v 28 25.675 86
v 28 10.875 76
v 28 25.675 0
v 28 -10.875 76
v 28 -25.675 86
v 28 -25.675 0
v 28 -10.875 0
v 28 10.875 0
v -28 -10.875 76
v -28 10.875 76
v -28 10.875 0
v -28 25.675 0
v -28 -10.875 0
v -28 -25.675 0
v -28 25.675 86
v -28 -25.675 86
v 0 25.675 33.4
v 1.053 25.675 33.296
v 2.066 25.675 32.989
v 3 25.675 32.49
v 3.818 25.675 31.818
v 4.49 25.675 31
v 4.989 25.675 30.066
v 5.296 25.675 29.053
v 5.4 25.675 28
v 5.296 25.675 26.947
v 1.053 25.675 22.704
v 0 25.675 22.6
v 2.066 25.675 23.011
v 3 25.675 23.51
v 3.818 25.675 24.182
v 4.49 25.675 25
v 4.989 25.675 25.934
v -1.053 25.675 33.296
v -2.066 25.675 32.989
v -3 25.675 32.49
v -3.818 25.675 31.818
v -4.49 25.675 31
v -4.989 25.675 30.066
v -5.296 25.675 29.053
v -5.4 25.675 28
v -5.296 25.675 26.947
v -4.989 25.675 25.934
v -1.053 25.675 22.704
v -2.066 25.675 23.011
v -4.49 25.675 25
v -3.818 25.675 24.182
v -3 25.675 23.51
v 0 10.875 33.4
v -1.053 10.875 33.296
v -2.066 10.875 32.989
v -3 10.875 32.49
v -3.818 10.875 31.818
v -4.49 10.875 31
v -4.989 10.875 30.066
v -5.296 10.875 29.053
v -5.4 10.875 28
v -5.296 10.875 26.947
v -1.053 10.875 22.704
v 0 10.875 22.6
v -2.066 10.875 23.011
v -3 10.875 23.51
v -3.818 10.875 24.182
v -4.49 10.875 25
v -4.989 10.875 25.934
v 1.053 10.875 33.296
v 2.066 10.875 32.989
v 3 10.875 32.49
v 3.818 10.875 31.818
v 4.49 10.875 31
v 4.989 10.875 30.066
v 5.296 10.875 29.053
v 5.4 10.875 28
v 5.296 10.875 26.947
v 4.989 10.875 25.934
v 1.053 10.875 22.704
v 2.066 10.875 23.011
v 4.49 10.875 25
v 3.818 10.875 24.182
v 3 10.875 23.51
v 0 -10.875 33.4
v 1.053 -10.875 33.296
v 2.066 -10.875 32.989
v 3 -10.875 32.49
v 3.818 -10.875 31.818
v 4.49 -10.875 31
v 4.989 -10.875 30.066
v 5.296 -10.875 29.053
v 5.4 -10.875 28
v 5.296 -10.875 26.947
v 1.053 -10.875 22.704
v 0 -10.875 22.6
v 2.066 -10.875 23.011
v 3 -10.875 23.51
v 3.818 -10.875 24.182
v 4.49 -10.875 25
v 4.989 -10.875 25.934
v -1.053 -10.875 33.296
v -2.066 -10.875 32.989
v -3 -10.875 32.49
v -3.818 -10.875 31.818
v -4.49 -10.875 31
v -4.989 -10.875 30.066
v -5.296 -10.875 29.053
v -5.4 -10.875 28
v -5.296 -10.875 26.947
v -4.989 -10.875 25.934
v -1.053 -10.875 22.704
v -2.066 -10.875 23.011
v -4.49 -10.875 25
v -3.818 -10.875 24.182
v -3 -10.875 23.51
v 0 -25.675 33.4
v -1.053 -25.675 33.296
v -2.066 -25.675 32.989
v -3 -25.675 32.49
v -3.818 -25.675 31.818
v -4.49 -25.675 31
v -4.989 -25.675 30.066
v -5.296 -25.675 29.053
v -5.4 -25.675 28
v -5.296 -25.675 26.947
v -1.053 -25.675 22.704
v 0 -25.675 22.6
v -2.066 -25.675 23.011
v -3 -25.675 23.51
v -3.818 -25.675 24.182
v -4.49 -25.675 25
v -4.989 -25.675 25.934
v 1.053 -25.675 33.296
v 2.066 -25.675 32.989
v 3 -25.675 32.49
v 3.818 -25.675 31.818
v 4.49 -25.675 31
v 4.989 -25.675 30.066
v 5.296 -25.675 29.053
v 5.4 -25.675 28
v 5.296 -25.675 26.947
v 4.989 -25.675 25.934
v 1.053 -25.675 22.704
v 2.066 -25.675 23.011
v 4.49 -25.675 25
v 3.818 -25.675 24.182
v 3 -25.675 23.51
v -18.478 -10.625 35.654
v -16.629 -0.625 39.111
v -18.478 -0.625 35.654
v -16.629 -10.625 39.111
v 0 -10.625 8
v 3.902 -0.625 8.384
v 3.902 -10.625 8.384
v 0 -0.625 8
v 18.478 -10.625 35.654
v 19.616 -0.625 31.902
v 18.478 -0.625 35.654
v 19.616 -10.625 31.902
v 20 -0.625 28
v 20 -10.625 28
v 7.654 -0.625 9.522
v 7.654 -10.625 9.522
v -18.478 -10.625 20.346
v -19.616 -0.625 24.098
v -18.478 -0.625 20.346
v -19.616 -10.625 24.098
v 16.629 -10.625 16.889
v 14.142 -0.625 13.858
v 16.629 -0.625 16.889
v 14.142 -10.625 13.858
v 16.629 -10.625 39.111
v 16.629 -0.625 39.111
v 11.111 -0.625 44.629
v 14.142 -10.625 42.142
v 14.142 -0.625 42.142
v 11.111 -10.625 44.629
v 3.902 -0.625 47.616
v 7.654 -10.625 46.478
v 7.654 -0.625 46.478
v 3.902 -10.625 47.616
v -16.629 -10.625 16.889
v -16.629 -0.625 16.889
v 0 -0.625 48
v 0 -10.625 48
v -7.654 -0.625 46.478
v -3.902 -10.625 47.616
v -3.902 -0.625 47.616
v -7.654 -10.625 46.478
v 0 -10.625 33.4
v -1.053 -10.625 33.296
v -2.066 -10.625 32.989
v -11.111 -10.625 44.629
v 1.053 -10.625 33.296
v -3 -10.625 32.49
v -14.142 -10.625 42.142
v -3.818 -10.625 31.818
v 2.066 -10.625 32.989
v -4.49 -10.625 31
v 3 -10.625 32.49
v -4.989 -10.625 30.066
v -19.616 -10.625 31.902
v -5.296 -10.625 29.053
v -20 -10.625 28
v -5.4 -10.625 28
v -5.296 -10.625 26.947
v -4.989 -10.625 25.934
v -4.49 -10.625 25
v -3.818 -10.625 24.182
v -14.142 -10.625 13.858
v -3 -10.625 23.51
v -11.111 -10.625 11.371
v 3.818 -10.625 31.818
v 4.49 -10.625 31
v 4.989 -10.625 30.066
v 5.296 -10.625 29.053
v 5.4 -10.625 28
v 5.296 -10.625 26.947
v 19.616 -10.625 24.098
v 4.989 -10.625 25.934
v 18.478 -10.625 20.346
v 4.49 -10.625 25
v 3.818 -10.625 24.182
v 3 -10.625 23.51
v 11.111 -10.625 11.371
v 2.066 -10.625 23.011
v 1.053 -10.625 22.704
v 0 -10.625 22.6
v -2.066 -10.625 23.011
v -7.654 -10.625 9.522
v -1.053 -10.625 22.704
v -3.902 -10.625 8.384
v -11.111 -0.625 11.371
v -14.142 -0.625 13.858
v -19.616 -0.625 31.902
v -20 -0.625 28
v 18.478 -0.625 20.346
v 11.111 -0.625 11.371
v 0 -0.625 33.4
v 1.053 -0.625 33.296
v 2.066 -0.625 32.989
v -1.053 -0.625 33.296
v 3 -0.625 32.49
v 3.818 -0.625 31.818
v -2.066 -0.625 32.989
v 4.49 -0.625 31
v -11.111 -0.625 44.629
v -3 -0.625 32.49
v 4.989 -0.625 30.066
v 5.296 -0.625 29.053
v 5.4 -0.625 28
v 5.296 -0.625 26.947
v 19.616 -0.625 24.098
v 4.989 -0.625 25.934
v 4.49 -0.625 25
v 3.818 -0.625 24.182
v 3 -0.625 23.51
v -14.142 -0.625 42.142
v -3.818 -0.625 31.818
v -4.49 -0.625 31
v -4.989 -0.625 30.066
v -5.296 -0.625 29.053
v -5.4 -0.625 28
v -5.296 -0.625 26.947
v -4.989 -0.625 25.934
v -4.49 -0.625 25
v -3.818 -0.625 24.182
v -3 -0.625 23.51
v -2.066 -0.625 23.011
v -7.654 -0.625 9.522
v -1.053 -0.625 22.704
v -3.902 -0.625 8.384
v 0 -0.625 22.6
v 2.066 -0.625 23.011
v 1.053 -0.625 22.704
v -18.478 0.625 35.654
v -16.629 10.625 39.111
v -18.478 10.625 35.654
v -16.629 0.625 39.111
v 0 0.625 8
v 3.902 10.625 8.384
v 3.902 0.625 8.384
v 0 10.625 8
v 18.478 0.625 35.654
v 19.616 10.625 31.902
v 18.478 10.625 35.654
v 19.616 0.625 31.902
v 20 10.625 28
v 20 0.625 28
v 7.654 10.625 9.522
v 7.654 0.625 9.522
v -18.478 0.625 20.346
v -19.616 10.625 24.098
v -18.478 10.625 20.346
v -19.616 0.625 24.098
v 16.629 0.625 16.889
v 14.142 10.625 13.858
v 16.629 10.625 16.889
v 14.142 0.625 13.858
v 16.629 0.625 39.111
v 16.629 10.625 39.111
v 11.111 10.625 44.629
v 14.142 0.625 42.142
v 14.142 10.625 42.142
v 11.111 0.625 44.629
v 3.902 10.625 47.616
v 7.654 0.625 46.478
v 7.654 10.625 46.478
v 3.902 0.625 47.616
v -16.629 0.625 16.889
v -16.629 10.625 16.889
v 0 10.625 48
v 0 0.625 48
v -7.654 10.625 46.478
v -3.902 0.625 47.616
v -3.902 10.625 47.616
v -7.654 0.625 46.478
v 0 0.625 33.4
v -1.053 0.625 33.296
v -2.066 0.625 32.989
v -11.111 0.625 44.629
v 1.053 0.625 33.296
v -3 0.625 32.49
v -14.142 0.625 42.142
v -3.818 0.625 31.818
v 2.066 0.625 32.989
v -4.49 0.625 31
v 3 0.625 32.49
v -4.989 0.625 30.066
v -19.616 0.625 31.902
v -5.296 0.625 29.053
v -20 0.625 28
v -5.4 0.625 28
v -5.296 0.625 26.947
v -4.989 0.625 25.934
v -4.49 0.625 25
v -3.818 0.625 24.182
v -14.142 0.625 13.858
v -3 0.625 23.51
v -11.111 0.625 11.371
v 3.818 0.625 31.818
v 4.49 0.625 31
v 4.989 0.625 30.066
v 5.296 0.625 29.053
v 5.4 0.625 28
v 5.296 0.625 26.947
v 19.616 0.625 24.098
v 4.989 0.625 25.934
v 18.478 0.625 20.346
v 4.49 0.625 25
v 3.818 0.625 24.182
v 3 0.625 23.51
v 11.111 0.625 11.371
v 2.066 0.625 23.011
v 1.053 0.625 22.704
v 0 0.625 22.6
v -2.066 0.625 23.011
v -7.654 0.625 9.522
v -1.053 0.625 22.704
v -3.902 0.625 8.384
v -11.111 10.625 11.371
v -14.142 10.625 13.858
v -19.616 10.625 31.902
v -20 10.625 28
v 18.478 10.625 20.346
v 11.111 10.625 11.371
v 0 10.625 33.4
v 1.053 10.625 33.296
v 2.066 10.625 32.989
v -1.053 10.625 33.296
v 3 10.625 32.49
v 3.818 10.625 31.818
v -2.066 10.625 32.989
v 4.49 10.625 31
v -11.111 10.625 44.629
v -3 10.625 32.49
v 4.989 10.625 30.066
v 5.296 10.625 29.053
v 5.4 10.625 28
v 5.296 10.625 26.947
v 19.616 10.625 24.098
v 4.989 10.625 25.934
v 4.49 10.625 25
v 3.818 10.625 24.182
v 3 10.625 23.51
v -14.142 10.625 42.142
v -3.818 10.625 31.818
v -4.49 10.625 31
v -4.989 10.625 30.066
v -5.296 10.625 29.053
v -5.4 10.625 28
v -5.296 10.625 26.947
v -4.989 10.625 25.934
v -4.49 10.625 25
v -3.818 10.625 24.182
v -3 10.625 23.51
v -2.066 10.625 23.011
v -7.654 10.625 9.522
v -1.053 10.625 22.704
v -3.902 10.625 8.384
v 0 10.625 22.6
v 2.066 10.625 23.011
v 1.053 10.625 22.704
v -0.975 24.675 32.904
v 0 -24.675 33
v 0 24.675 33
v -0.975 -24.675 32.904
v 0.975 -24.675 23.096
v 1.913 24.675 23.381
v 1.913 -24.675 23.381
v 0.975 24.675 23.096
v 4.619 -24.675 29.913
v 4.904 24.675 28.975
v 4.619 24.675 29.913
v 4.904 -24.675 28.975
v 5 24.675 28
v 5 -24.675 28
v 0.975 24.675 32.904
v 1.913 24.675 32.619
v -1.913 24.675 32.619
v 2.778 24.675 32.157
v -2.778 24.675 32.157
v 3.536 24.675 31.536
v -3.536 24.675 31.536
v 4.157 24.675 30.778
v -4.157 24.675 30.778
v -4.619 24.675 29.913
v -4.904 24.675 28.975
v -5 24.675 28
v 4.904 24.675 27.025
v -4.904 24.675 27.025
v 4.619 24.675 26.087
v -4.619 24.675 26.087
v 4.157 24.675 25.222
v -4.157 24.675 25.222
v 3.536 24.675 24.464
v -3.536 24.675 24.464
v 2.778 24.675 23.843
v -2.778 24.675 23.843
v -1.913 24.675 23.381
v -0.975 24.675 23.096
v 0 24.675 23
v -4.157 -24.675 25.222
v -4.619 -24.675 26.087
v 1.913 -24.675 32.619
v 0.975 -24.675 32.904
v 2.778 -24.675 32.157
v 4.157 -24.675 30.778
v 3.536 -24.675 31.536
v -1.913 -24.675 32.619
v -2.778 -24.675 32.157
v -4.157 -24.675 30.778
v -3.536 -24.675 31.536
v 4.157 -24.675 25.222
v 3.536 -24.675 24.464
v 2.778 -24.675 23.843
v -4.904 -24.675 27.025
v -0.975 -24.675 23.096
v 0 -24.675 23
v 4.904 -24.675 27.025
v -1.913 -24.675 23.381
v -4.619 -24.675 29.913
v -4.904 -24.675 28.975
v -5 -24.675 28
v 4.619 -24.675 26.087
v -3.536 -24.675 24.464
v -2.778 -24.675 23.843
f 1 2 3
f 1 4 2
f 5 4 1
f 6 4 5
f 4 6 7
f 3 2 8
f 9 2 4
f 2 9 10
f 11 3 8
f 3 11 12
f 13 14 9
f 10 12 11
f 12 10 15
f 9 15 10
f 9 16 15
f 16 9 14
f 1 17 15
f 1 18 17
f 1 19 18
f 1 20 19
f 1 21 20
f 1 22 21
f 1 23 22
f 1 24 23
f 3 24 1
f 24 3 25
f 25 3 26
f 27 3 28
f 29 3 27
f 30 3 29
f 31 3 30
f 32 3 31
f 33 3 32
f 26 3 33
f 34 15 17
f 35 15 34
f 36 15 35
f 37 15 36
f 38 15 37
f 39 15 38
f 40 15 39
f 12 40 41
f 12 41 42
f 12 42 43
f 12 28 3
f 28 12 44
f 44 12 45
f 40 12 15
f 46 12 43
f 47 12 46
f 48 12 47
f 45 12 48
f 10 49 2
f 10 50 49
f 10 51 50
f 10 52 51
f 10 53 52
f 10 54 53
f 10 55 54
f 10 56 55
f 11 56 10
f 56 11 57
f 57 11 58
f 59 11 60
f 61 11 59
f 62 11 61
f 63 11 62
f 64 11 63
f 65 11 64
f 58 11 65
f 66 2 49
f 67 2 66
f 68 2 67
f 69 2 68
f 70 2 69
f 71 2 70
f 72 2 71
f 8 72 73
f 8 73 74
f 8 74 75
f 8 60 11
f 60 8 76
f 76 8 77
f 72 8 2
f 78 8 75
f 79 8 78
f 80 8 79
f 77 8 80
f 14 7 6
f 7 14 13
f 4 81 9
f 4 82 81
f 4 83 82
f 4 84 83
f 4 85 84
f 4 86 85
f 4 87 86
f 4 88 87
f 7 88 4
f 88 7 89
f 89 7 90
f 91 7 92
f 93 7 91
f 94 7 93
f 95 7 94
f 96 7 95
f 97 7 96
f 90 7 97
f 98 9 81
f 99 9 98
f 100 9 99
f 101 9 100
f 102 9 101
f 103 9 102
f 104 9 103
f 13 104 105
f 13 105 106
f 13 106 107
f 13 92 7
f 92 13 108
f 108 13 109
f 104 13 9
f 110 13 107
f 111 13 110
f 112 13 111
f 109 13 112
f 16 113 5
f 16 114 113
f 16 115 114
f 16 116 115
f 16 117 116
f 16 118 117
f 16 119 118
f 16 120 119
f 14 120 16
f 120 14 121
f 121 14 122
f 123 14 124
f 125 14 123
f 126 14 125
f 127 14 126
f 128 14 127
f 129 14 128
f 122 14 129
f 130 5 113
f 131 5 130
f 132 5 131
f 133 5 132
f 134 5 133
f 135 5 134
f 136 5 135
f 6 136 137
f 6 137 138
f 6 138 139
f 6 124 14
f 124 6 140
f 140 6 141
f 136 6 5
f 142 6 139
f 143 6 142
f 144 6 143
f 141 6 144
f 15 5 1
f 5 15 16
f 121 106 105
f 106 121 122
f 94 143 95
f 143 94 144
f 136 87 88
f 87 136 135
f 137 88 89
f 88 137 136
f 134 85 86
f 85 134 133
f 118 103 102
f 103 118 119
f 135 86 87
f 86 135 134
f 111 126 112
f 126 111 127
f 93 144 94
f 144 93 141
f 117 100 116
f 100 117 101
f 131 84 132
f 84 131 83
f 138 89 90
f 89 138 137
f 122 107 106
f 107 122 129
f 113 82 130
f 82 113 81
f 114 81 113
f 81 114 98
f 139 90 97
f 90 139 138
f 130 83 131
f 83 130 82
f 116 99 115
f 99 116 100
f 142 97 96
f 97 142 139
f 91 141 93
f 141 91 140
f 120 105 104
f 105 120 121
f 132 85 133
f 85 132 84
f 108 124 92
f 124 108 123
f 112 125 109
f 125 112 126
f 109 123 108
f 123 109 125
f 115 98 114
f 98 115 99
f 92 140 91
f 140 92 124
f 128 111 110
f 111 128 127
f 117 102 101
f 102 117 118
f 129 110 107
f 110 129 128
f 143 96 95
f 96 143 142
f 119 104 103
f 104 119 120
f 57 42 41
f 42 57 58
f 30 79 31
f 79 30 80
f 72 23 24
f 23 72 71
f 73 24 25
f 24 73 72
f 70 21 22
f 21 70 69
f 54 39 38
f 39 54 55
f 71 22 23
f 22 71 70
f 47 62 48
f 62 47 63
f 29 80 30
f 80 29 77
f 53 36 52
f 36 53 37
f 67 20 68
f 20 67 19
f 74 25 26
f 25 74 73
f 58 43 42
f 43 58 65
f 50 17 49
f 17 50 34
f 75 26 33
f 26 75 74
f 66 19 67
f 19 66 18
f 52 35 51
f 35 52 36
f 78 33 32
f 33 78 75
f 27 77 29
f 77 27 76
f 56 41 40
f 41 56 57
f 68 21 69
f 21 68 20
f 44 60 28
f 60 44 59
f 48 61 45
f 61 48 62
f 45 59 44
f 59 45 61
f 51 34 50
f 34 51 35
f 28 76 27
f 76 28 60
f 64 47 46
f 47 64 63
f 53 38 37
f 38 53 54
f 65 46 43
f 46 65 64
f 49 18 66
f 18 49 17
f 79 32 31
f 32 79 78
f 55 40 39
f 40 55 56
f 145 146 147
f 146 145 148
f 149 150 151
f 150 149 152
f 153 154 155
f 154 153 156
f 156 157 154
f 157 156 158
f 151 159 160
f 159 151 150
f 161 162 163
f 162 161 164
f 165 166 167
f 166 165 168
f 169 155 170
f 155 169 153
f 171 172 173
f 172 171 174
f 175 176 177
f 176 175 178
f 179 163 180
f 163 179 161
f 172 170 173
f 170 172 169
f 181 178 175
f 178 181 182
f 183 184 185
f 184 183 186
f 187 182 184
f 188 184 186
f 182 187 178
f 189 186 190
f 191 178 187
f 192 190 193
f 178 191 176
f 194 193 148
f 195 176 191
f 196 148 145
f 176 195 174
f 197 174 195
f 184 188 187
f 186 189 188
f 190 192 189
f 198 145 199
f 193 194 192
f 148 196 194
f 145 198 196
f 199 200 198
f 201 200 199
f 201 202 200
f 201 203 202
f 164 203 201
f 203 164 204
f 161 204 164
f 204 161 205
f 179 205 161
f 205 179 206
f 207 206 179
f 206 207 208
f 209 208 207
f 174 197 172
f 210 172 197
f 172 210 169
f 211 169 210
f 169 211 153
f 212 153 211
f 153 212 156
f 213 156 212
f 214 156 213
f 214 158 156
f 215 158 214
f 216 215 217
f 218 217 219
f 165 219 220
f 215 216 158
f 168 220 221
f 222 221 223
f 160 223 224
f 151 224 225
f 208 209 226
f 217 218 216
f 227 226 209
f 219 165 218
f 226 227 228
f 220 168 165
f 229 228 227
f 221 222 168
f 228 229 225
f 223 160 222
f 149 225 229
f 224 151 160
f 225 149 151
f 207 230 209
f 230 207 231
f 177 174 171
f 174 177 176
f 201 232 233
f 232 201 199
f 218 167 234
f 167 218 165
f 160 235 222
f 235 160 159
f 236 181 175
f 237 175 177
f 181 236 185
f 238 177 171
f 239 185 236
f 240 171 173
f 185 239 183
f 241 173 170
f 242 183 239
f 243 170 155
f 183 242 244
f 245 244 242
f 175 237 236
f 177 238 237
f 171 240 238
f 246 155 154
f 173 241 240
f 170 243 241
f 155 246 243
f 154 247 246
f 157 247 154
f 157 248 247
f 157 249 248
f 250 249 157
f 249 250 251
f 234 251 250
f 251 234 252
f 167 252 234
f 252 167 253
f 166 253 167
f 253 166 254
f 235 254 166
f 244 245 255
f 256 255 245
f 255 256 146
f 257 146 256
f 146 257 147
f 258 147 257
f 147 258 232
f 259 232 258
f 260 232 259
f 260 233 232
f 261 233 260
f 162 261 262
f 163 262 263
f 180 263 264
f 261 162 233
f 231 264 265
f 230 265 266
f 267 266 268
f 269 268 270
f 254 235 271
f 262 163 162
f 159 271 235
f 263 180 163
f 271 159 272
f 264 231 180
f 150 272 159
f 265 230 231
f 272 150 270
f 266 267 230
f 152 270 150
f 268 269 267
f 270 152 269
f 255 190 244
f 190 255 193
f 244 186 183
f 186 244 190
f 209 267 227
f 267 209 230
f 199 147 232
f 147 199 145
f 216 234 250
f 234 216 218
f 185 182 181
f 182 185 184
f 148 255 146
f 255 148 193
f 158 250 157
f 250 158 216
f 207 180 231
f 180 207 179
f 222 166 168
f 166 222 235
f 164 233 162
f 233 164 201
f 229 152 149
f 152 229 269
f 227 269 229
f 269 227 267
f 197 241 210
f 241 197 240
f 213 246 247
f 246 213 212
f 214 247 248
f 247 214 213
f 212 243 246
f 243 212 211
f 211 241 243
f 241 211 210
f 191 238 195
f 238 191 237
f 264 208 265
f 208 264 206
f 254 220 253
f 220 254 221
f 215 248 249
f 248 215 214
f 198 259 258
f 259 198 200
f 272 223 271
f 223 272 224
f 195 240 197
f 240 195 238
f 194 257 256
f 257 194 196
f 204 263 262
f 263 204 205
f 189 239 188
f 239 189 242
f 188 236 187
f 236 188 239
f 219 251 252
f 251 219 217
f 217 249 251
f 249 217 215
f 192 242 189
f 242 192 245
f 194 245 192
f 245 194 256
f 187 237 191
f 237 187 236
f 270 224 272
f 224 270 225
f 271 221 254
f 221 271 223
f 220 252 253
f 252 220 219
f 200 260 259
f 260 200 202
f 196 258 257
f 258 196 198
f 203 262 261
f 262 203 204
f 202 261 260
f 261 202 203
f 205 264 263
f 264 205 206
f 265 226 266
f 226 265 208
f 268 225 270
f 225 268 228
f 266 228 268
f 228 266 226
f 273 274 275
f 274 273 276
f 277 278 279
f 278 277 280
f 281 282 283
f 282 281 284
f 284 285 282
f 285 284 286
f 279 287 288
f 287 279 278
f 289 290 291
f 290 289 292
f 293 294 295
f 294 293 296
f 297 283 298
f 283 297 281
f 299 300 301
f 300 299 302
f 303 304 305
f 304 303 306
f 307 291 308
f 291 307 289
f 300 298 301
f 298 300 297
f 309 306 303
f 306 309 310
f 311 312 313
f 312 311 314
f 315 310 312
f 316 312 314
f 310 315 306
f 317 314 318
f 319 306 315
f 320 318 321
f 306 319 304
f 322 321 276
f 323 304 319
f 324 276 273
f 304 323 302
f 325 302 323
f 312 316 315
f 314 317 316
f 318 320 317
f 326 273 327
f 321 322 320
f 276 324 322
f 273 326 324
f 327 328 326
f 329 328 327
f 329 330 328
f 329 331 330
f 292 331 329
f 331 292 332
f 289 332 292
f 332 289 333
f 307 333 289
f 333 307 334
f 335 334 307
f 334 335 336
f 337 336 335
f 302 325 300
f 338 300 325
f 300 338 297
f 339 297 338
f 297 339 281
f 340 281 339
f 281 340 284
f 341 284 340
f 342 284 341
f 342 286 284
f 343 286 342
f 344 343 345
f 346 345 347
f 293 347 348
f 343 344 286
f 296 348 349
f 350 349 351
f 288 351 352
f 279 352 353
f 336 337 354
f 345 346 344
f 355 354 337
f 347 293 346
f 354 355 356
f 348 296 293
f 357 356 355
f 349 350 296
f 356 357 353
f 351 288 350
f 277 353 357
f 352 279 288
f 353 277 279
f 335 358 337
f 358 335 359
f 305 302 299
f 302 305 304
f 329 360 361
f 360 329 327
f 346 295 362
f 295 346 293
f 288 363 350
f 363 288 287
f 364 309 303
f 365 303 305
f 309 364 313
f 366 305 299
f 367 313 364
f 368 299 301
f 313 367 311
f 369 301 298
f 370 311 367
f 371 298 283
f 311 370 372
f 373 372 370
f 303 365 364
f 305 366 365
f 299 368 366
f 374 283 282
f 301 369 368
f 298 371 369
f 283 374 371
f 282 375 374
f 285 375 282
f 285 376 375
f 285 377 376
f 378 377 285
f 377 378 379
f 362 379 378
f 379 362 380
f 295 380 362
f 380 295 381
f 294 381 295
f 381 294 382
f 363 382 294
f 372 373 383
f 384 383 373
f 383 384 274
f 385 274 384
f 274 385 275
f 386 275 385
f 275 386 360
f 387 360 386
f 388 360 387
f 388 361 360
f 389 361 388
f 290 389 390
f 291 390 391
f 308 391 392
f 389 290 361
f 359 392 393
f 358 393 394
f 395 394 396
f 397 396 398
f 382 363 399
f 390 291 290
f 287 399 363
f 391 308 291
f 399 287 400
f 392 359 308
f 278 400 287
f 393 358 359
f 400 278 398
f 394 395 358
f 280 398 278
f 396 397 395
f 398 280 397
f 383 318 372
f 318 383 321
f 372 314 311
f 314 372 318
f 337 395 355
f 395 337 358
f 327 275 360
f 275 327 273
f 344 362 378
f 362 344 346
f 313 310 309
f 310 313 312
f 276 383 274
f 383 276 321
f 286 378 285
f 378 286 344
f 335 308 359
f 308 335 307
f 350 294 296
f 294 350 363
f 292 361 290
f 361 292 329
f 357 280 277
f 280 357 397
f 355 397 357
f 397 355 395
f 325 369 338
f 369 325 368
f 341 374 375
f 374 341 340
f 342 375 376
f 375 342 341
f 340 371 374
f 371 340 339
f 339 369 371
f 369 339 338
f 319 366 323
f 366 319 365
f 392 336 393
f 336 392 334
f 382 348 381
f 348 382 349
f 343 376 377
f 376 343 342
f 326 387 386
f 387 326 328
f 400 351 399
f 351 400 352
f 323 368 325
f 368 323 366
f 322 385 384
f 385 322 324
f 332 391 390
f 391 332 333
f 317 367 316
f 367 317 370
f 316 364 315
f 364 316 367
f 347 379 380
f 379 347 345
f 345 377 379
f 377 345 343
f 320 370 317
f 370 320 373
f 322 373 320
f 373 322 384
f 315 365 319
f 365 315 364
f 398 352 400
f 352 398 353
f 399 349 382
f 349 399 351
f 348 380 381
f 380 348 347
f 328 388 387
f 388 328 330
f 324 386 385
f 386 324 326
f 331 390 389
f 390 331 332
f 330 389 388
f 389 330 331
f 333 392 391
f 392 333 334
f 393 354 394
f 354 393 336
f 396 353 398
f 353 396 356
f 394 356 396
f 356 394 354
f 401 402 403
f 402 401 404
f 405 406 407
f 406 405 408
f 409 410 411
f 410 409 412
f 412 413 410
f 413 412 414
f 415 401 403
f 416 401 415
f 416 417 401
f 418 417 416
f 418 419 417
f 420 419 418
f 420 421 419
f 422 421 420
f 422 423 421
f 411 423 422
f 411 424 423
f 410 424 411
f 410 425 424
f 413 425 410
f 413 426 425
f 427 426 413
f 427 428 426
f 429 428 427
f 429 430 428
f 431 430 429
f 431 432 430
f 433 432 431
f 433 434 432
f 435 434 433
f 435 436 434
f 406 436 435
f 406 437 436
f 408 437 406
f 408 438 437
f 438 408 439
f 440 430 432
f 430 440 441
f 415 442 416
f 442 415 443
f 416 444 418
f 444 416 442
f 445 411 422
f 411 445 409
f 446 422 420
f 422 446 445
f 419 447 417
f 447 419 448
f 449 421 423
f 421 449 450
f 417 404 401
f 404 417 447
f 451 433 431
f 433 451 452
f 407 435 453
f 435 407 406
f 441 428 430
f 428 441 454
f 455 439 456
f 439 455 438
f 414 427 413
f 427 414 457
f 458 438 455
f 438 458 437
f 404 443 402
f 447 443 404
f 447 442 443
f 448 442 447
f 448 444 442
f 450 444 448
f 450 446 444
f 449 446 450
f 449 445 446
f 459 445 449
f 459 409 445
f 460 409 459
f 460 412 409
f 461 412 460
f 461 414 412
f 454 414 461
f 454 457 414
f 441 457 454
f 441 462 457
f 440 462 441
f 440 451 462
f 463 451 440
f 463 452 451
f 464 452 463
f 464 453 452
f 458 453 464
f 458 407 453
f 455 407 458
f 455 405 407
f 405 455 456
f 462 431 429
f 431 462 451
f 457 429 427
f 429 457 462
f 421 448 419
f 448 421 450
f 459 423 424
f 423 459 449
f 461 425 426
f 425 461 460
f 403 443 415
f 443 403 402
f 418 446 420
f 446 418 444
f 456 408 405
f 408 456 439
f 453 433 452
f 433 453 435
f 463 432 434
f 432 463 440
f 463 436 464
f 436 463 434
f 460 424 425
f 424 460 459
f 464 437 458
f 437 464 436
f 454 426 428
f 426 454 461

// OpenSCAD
$fn = 32;

// ------------------------------------------------------------------------
// Trolley wheel set: wheels d40, fork 76 mm tall
// Every part is its own module, assembly() places every instance.
// ------------------------------------------------------------------------

// --- part 1 ---
module trolley_fork() {
  difference() {
    union() {
      translate([-28, 10.875, 0]) cube([56, 14.8, 76]);
      translate([-28, -25.675, 0]) cube([56, 14.8, 76]);
      translate([-28, -25.675, 76]) cube([56, 51.35, 10]);
    }
    translate([0, -18.275, 28]) rotate([90, 0, 0]) cylinder(h = 16.8, d = 10.8, center = true);
    translate([0, 18.275, 28]) rotate([90, 0, 0]) cylinder(h = 16.8, d = 10.8, center = true);
  }
}

// --- part 2 ---
module trolley_wheel() {
  difference() {
      translate([0, 0, 0]) cylinder(h = 10, d = 40);
      translate([0, 0, -1]) cylinder(h = 12, d = 10.8);
    }
}

// --- part 3 ---
module trolley_axle() {
  translate([0, 0, -24.675]) cylinder(h = 49.35, d = 10);
}

// --- assembly ---
module assembly() {
  color([0.80, 0.24, 0.20]) translate([0, 0, 0]) rotate([0, 0, 0]) trolley_fork();
  color([0.20, 0.45, 0.75]) translate([0, -0.625, 28]) rotate([90, 0, 0]) trolley_wheel();
  color([0.25, 0.62, 0.32]) translate([0, 10.625, 28]) rotate([90, 0, 0]) trolley_wheel();
  color([0.92, 0.70, 0.18]) translate([0, 0, 28]) rotate([90, 0, 0]) trolley_axle();
}

assembly();
